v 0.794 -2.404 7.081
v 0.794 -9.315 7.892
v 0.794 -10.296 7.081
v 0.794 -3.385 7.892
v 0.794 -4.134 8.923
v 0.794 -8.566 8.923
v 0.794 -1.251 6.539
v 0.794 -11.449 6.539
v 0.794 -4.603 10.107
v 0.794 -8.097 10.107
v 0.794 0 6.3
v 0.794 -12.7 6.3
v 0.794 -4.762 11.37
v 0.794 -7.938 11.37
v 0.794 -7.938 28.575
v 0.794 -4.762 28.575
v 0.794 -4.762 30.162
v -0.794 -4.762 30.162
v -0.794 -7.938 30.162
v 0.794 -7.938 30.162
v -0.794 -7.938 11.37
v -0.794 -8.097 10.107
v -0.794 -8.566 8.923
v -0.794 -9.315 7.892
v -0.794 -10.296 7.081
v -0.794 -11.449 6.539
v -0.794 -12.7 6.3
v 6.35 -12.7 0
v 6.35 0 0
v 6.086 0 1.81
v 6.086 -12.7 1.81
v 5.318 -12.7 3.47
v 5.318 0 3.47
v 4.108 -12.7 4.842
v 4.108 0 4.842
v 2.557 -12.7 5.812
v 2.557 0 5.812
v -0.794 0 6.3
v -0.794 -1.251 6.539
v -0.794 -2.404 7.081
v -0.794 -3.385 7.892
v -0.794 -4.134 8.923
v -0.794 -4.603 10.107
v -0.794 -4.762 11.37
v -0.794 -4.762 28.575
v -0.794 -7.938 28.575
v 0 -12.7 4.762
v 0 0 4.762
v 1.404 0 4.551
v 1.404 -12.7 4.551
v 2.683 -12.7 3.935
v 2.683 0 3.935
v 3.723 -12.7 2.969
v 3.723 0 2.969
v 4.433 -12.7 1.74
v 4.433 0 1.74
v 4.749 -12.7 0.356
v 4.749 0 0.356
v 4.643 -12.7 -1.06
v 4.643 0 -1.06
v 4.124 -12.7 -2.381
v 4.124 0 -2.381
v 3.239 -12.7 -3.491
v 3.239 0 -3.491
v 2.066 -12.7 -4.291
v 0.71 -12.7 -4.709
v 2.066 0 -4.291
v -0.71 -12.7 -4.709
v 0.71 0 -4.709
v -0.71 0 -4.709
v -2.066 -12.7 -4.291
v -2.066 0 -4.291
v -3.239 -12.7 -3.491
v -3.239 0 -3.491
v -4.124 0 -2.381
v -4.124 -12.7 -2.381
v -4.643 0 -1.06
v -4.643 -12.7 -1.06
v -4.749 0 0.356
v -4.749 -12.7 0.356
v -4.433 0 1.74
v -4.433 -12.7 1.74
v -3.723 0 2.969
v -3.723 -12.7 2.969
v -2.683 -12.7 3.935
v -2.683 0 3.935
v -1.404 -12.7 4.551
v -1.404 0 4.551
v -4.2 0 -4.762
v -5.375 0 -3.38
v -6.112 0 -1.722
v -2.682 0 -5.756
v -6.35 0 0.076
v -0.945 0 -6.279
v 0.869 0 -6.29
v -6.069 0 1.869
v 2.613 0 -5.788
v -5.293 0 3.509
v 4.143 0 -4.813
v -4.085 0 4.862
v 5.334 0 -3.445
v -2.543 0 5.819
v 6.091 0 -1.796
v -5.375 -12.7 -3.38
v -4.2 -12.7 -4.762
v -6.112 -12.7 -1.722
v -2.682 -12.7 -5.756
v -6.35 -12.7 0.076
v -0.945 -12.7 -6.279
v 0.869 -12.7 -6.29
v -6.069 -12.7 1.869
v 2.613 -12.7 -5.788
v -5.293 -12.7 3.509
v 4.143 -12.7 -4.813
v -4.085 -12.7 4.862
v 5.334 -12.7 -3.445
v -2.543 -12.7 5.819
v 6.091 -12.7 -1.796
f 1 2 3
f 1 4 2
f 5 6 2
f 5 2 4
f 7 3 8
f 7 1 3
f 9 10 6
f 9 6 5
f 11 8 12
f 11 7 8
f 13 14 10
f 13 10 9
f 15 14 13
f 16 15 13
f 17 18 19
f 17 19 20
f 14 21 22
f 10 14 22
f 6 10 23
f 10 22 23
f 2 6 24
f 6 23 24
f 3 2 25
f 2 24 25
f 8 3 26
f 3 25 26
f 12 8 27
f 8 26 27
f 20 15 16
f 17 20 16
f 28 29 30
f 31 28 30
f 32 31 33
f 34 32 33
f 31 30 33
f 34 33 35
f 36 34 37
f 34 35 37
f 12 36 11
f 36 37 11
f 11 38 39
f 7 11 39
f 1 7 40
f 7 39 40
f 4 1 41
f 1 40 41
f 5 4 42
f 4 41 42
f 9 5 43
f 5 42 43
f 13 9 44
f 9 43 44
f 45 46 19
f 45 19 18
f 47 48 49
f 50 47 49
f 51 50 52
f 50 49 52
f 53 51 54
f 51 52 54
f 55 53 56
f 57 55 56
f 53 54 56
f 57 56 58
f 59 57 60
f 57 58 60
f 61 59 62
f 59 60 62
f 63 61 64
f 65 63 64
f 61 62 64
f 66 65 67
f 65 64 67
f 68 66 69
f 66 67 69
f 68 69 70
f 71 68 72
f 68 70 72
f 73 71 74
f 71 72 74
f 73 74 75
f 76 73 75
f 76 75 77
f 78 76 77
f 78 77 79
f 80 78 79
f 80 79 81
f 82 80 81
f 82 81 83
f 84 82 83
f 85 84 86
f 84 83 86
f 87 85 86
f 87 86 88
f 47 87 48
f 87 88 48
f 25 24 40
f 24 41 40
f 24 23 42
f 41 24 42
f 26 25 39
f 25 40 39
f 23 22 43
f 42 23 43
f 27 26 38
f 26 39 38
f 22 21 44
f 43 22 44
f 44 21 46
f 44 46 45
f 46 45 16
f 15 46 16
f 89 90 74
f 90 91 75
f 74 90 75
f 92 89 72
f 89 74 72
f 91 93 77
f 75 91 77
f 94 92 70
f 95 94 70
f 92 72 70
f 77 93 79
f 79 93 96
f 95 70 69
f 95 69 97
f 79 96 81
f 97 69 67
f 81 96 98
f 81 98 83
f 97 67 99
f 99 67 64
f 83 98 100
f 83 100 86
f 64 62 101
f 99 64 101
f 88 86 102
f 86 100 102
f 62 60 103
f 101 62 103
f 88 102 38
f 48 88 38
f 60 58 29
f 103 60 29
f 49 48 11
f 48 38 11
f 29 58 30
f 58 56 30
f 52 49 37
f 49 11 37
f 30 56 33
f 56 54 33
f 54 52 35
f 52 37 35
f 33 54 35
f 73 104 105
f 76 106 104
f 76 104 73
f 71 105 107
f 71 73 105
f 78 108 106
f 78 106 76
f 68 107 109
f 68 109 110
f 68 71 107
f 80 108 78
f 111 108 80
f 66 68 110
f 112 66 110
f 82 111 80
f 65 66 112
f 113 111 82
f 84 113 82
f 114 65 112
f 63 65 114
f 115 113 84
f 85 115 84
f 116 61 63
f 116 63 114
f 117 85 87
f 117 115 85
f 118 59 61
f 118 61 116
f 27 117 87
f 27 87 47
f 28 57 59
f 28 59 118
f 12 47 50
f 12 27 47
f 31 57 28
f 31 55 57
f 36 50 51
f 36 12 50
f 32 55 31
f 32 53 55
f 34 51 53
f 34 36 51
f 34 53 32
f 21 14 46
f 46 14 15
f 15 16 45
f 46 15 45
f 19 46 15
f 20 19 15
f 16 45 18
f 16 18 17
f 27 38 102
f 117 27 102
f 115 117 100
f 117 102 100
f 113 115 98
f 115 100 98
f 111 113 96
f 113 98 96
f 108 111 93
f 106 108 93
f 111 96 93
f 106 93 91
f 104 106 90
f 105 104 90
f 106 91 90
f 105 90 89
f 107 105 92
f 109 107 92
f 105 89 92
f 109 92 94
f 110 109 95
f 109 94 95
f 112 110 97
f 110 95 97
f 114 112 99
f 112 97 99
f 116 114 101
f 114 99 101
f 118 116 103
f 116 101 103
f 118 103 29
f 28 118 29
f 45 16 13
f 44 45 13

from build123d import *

# Parameters (mm, degrees)
F1_DEPTH    = 12.7
F3_DEPTH    = 25.4
F4_T1_DEPTH = 1.5875
F5_T1_DEPTH = 1.5875
F6_W        = 1.5875
F6_H        = 1.5875
F7_DEPTH    = 25.4
F8_W        = 1.5875
F8_H        = 3.175
F9_DEPTH    = 1.5875


# Not quite as in the source:
# - a fillet or chamfer that OpenCascade refuses, or shapes differently, is made with other operations: its cross-section is extruded or revolved along the edge and cut away or added


with BuildPart() as f1:
    # F0 (on Front) → F1 (new body)
    with BuildSketch(Plane.XZ):
        with BuildLine():
            Line((0.79375, 4.7625), (0, 4.7625))
            Line((0, 4.7625), (-0.79375, 4.7625))
            Line((-0.79375, 4.7625), (-0.79375, 6.3001953095))
            ThreePointArc((-0.79375, 6.3001953095), (-4.2001302063, -4.7625), (6.35, 0))
            ThreePointArc((6.35, 0), (4.7625, 4.2001302063), (0.79375, 6.3001953095))
            Line((0.79375, 6.3001953095), (0.79375, 4.7625))
        make_face()
        with BuildLine():
            ThreePointArc((0, 4.7625), (3.3675960454, 3.3675960454), (4.7625, 0))
            ThreePointArc((4.7625, 0), (-3.3675960454, -3.3675960454), (0, 4.7625))
        make_face(mode=Mode.SUBTRACT)
        with BuildLine():
            Line((-0.79375, 4.7625), (0, 4.7625))
            Line((0, 4.7625), (0.79375, 4.7625))
            Line((0.79375, 4.7625), (0.79375, 6.3001953095))
            ThreePointArc((0.79375, 6.3001953095), (0, 6.35), (-0.79375, 6.3001953095))
            Line((-0.79375, 6.3001953095), (-0.79375, 4.7625))
        make_face()
        with BuildLine():
            Line((-0.79375, 30.1625), (-0.79375, 6.3001953095))
            ThreePointArc((-0.79375, 6.3001953095), (0, 6.35), (0.79375, 6.3001953095))
            Line((0.79375, 6.3001953095), (0.79375, 30.1625))
            Line((0.79375, 30.1625), (-0.79375, 30.1625))
        make_face()
    extrude(amount=F1_DEPTH)

    # F2 (on face) → F3 (cut)
    with BuildSketch(Plane.YZ.offset(0.79375)):
        Polygon((-7.9375, 6.3001953095), (-7.9375, 30.1625), (-4.7625, 30.1625), (-4.7625, 6.3001953095), (8.4503721446, 6.3001953095), (8.4503721446, 42.4300841987), (-23.5275886953, 42.4300841987), (-23.5275886953, 6.3001953095), align=None)
    extrude(amount=-F3_DEPTH, mode=Mode.SUBTRACT)

    # F4: fillet of radius 5.08 on 1 edges, made by hand

    # F4_s2 → F4_t1 (join)
    with BuildSketch(Plane.YZ.offset(-0.79375)):
        with BuildLine():
            ThreePointArc((0, 6.3001953095), (-3.3851544532, 7.892225486), (-4.7625, 11.3702637262))
            Line((-4.7625, 11.3702637262), (-4.7625, 6.3001953095))
            Line((-4.7625, 6.3001953095), (0, 6.3001953095))
        make_face()
    extrude(amount=F4_T1_DEPTH)

    # F5: fillet of radius 5.08 on 1 edges, made by hand

    # F5_s2 → F5_t1 (join)
    with BuildSketch(Plane.YZ.offset(-0.79375)):
        with BuildLine():
            ThreePointArc((-7.9375, 11.3702637262), (-9.3148455468, 7.892225486), (-12.7, 6.3001953095))
            Line((-12.7, 6.3001953095), (-7.9375, 6.3001953095))
            Line((-7.9375, 6.3001953095), (-7.9375, 11.3702637262))
        make_face()
    extrude(amount=F5_T1_DEPTH)

    # F6 (on face) → F7 (cut)
    with BuildSketch(Plane(origin=(0, -4.7625, 0), x_dir=(-1, 0, 0), z_dir=(0, 1, 0))):
        with Locations((0, 29.36875)):
            Rectangle(F6_W, F6_H)
    extrude(amount=-F7_DEPTH, mode=Mode.SUBTRACT)


with BuildPart() as f9:
    # F8 (on face) → F9 (new body)
    with BuildSketch(Plane.XY.offset(28.575)):
        with Locations((0, -6.35)):
            Rectangle(F8_W, F8_H)
    extrude(amount=F9_DEPTH)


solid = Compound([f1.part, f9.part])
